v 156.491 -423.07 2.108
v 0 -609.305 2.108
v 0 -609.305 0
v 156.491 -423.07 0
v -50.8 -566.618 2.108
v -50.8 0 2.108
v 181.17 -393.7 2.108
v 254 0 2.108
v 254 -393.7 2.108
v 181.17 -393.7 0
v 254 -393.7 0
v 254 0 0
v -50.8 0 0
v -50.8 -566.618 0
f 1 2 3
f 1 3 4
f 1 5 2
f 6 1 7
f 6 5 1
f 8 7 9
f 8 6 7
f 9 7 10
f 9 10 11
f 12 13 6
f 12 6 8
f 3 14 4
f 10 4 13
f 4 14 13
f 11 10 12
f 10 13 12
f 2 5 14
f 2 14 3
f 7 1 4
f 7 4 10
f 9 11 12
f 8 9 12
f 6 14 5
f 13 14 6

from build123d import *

# Parameters (mm, degrees)
SKETCH1_W           = 304.8
SKETCH1_H           = 609.6
BOSS_EXTRUDE1_DEPTH = 2.1082
CUT_EXTRUDE1_DEPTH  = 2.1082


with BuildPart() as part:
    # Sketch1 → Boss-Extrude1 (new body)
    with BuildSketch(Plane.XY):
        with Locations((101.6, -304.8)):
            Rectangle(SKETCH1_W, SKETCH1_H)
    extrude(amount=BOSS_EXTRUDE1_DEPTH)

    # Sketch2 → Cut-Extrude1 (cut)
    with BuildSketch(Plane.XY.offset(2.1082)):
        Polygon((-50.8, -609.6), (-50.8, -566.618355908), (0, -609.30496414), (156.491241029, -423.069623049), (181.170170025, -393.7), (254, -393.7), (254, -609.6), align=None)
    extrude(amount=-CUT_EXTRUDE1_DEPTH, mode=Mode.SUBTRACT)


solid = part.part
